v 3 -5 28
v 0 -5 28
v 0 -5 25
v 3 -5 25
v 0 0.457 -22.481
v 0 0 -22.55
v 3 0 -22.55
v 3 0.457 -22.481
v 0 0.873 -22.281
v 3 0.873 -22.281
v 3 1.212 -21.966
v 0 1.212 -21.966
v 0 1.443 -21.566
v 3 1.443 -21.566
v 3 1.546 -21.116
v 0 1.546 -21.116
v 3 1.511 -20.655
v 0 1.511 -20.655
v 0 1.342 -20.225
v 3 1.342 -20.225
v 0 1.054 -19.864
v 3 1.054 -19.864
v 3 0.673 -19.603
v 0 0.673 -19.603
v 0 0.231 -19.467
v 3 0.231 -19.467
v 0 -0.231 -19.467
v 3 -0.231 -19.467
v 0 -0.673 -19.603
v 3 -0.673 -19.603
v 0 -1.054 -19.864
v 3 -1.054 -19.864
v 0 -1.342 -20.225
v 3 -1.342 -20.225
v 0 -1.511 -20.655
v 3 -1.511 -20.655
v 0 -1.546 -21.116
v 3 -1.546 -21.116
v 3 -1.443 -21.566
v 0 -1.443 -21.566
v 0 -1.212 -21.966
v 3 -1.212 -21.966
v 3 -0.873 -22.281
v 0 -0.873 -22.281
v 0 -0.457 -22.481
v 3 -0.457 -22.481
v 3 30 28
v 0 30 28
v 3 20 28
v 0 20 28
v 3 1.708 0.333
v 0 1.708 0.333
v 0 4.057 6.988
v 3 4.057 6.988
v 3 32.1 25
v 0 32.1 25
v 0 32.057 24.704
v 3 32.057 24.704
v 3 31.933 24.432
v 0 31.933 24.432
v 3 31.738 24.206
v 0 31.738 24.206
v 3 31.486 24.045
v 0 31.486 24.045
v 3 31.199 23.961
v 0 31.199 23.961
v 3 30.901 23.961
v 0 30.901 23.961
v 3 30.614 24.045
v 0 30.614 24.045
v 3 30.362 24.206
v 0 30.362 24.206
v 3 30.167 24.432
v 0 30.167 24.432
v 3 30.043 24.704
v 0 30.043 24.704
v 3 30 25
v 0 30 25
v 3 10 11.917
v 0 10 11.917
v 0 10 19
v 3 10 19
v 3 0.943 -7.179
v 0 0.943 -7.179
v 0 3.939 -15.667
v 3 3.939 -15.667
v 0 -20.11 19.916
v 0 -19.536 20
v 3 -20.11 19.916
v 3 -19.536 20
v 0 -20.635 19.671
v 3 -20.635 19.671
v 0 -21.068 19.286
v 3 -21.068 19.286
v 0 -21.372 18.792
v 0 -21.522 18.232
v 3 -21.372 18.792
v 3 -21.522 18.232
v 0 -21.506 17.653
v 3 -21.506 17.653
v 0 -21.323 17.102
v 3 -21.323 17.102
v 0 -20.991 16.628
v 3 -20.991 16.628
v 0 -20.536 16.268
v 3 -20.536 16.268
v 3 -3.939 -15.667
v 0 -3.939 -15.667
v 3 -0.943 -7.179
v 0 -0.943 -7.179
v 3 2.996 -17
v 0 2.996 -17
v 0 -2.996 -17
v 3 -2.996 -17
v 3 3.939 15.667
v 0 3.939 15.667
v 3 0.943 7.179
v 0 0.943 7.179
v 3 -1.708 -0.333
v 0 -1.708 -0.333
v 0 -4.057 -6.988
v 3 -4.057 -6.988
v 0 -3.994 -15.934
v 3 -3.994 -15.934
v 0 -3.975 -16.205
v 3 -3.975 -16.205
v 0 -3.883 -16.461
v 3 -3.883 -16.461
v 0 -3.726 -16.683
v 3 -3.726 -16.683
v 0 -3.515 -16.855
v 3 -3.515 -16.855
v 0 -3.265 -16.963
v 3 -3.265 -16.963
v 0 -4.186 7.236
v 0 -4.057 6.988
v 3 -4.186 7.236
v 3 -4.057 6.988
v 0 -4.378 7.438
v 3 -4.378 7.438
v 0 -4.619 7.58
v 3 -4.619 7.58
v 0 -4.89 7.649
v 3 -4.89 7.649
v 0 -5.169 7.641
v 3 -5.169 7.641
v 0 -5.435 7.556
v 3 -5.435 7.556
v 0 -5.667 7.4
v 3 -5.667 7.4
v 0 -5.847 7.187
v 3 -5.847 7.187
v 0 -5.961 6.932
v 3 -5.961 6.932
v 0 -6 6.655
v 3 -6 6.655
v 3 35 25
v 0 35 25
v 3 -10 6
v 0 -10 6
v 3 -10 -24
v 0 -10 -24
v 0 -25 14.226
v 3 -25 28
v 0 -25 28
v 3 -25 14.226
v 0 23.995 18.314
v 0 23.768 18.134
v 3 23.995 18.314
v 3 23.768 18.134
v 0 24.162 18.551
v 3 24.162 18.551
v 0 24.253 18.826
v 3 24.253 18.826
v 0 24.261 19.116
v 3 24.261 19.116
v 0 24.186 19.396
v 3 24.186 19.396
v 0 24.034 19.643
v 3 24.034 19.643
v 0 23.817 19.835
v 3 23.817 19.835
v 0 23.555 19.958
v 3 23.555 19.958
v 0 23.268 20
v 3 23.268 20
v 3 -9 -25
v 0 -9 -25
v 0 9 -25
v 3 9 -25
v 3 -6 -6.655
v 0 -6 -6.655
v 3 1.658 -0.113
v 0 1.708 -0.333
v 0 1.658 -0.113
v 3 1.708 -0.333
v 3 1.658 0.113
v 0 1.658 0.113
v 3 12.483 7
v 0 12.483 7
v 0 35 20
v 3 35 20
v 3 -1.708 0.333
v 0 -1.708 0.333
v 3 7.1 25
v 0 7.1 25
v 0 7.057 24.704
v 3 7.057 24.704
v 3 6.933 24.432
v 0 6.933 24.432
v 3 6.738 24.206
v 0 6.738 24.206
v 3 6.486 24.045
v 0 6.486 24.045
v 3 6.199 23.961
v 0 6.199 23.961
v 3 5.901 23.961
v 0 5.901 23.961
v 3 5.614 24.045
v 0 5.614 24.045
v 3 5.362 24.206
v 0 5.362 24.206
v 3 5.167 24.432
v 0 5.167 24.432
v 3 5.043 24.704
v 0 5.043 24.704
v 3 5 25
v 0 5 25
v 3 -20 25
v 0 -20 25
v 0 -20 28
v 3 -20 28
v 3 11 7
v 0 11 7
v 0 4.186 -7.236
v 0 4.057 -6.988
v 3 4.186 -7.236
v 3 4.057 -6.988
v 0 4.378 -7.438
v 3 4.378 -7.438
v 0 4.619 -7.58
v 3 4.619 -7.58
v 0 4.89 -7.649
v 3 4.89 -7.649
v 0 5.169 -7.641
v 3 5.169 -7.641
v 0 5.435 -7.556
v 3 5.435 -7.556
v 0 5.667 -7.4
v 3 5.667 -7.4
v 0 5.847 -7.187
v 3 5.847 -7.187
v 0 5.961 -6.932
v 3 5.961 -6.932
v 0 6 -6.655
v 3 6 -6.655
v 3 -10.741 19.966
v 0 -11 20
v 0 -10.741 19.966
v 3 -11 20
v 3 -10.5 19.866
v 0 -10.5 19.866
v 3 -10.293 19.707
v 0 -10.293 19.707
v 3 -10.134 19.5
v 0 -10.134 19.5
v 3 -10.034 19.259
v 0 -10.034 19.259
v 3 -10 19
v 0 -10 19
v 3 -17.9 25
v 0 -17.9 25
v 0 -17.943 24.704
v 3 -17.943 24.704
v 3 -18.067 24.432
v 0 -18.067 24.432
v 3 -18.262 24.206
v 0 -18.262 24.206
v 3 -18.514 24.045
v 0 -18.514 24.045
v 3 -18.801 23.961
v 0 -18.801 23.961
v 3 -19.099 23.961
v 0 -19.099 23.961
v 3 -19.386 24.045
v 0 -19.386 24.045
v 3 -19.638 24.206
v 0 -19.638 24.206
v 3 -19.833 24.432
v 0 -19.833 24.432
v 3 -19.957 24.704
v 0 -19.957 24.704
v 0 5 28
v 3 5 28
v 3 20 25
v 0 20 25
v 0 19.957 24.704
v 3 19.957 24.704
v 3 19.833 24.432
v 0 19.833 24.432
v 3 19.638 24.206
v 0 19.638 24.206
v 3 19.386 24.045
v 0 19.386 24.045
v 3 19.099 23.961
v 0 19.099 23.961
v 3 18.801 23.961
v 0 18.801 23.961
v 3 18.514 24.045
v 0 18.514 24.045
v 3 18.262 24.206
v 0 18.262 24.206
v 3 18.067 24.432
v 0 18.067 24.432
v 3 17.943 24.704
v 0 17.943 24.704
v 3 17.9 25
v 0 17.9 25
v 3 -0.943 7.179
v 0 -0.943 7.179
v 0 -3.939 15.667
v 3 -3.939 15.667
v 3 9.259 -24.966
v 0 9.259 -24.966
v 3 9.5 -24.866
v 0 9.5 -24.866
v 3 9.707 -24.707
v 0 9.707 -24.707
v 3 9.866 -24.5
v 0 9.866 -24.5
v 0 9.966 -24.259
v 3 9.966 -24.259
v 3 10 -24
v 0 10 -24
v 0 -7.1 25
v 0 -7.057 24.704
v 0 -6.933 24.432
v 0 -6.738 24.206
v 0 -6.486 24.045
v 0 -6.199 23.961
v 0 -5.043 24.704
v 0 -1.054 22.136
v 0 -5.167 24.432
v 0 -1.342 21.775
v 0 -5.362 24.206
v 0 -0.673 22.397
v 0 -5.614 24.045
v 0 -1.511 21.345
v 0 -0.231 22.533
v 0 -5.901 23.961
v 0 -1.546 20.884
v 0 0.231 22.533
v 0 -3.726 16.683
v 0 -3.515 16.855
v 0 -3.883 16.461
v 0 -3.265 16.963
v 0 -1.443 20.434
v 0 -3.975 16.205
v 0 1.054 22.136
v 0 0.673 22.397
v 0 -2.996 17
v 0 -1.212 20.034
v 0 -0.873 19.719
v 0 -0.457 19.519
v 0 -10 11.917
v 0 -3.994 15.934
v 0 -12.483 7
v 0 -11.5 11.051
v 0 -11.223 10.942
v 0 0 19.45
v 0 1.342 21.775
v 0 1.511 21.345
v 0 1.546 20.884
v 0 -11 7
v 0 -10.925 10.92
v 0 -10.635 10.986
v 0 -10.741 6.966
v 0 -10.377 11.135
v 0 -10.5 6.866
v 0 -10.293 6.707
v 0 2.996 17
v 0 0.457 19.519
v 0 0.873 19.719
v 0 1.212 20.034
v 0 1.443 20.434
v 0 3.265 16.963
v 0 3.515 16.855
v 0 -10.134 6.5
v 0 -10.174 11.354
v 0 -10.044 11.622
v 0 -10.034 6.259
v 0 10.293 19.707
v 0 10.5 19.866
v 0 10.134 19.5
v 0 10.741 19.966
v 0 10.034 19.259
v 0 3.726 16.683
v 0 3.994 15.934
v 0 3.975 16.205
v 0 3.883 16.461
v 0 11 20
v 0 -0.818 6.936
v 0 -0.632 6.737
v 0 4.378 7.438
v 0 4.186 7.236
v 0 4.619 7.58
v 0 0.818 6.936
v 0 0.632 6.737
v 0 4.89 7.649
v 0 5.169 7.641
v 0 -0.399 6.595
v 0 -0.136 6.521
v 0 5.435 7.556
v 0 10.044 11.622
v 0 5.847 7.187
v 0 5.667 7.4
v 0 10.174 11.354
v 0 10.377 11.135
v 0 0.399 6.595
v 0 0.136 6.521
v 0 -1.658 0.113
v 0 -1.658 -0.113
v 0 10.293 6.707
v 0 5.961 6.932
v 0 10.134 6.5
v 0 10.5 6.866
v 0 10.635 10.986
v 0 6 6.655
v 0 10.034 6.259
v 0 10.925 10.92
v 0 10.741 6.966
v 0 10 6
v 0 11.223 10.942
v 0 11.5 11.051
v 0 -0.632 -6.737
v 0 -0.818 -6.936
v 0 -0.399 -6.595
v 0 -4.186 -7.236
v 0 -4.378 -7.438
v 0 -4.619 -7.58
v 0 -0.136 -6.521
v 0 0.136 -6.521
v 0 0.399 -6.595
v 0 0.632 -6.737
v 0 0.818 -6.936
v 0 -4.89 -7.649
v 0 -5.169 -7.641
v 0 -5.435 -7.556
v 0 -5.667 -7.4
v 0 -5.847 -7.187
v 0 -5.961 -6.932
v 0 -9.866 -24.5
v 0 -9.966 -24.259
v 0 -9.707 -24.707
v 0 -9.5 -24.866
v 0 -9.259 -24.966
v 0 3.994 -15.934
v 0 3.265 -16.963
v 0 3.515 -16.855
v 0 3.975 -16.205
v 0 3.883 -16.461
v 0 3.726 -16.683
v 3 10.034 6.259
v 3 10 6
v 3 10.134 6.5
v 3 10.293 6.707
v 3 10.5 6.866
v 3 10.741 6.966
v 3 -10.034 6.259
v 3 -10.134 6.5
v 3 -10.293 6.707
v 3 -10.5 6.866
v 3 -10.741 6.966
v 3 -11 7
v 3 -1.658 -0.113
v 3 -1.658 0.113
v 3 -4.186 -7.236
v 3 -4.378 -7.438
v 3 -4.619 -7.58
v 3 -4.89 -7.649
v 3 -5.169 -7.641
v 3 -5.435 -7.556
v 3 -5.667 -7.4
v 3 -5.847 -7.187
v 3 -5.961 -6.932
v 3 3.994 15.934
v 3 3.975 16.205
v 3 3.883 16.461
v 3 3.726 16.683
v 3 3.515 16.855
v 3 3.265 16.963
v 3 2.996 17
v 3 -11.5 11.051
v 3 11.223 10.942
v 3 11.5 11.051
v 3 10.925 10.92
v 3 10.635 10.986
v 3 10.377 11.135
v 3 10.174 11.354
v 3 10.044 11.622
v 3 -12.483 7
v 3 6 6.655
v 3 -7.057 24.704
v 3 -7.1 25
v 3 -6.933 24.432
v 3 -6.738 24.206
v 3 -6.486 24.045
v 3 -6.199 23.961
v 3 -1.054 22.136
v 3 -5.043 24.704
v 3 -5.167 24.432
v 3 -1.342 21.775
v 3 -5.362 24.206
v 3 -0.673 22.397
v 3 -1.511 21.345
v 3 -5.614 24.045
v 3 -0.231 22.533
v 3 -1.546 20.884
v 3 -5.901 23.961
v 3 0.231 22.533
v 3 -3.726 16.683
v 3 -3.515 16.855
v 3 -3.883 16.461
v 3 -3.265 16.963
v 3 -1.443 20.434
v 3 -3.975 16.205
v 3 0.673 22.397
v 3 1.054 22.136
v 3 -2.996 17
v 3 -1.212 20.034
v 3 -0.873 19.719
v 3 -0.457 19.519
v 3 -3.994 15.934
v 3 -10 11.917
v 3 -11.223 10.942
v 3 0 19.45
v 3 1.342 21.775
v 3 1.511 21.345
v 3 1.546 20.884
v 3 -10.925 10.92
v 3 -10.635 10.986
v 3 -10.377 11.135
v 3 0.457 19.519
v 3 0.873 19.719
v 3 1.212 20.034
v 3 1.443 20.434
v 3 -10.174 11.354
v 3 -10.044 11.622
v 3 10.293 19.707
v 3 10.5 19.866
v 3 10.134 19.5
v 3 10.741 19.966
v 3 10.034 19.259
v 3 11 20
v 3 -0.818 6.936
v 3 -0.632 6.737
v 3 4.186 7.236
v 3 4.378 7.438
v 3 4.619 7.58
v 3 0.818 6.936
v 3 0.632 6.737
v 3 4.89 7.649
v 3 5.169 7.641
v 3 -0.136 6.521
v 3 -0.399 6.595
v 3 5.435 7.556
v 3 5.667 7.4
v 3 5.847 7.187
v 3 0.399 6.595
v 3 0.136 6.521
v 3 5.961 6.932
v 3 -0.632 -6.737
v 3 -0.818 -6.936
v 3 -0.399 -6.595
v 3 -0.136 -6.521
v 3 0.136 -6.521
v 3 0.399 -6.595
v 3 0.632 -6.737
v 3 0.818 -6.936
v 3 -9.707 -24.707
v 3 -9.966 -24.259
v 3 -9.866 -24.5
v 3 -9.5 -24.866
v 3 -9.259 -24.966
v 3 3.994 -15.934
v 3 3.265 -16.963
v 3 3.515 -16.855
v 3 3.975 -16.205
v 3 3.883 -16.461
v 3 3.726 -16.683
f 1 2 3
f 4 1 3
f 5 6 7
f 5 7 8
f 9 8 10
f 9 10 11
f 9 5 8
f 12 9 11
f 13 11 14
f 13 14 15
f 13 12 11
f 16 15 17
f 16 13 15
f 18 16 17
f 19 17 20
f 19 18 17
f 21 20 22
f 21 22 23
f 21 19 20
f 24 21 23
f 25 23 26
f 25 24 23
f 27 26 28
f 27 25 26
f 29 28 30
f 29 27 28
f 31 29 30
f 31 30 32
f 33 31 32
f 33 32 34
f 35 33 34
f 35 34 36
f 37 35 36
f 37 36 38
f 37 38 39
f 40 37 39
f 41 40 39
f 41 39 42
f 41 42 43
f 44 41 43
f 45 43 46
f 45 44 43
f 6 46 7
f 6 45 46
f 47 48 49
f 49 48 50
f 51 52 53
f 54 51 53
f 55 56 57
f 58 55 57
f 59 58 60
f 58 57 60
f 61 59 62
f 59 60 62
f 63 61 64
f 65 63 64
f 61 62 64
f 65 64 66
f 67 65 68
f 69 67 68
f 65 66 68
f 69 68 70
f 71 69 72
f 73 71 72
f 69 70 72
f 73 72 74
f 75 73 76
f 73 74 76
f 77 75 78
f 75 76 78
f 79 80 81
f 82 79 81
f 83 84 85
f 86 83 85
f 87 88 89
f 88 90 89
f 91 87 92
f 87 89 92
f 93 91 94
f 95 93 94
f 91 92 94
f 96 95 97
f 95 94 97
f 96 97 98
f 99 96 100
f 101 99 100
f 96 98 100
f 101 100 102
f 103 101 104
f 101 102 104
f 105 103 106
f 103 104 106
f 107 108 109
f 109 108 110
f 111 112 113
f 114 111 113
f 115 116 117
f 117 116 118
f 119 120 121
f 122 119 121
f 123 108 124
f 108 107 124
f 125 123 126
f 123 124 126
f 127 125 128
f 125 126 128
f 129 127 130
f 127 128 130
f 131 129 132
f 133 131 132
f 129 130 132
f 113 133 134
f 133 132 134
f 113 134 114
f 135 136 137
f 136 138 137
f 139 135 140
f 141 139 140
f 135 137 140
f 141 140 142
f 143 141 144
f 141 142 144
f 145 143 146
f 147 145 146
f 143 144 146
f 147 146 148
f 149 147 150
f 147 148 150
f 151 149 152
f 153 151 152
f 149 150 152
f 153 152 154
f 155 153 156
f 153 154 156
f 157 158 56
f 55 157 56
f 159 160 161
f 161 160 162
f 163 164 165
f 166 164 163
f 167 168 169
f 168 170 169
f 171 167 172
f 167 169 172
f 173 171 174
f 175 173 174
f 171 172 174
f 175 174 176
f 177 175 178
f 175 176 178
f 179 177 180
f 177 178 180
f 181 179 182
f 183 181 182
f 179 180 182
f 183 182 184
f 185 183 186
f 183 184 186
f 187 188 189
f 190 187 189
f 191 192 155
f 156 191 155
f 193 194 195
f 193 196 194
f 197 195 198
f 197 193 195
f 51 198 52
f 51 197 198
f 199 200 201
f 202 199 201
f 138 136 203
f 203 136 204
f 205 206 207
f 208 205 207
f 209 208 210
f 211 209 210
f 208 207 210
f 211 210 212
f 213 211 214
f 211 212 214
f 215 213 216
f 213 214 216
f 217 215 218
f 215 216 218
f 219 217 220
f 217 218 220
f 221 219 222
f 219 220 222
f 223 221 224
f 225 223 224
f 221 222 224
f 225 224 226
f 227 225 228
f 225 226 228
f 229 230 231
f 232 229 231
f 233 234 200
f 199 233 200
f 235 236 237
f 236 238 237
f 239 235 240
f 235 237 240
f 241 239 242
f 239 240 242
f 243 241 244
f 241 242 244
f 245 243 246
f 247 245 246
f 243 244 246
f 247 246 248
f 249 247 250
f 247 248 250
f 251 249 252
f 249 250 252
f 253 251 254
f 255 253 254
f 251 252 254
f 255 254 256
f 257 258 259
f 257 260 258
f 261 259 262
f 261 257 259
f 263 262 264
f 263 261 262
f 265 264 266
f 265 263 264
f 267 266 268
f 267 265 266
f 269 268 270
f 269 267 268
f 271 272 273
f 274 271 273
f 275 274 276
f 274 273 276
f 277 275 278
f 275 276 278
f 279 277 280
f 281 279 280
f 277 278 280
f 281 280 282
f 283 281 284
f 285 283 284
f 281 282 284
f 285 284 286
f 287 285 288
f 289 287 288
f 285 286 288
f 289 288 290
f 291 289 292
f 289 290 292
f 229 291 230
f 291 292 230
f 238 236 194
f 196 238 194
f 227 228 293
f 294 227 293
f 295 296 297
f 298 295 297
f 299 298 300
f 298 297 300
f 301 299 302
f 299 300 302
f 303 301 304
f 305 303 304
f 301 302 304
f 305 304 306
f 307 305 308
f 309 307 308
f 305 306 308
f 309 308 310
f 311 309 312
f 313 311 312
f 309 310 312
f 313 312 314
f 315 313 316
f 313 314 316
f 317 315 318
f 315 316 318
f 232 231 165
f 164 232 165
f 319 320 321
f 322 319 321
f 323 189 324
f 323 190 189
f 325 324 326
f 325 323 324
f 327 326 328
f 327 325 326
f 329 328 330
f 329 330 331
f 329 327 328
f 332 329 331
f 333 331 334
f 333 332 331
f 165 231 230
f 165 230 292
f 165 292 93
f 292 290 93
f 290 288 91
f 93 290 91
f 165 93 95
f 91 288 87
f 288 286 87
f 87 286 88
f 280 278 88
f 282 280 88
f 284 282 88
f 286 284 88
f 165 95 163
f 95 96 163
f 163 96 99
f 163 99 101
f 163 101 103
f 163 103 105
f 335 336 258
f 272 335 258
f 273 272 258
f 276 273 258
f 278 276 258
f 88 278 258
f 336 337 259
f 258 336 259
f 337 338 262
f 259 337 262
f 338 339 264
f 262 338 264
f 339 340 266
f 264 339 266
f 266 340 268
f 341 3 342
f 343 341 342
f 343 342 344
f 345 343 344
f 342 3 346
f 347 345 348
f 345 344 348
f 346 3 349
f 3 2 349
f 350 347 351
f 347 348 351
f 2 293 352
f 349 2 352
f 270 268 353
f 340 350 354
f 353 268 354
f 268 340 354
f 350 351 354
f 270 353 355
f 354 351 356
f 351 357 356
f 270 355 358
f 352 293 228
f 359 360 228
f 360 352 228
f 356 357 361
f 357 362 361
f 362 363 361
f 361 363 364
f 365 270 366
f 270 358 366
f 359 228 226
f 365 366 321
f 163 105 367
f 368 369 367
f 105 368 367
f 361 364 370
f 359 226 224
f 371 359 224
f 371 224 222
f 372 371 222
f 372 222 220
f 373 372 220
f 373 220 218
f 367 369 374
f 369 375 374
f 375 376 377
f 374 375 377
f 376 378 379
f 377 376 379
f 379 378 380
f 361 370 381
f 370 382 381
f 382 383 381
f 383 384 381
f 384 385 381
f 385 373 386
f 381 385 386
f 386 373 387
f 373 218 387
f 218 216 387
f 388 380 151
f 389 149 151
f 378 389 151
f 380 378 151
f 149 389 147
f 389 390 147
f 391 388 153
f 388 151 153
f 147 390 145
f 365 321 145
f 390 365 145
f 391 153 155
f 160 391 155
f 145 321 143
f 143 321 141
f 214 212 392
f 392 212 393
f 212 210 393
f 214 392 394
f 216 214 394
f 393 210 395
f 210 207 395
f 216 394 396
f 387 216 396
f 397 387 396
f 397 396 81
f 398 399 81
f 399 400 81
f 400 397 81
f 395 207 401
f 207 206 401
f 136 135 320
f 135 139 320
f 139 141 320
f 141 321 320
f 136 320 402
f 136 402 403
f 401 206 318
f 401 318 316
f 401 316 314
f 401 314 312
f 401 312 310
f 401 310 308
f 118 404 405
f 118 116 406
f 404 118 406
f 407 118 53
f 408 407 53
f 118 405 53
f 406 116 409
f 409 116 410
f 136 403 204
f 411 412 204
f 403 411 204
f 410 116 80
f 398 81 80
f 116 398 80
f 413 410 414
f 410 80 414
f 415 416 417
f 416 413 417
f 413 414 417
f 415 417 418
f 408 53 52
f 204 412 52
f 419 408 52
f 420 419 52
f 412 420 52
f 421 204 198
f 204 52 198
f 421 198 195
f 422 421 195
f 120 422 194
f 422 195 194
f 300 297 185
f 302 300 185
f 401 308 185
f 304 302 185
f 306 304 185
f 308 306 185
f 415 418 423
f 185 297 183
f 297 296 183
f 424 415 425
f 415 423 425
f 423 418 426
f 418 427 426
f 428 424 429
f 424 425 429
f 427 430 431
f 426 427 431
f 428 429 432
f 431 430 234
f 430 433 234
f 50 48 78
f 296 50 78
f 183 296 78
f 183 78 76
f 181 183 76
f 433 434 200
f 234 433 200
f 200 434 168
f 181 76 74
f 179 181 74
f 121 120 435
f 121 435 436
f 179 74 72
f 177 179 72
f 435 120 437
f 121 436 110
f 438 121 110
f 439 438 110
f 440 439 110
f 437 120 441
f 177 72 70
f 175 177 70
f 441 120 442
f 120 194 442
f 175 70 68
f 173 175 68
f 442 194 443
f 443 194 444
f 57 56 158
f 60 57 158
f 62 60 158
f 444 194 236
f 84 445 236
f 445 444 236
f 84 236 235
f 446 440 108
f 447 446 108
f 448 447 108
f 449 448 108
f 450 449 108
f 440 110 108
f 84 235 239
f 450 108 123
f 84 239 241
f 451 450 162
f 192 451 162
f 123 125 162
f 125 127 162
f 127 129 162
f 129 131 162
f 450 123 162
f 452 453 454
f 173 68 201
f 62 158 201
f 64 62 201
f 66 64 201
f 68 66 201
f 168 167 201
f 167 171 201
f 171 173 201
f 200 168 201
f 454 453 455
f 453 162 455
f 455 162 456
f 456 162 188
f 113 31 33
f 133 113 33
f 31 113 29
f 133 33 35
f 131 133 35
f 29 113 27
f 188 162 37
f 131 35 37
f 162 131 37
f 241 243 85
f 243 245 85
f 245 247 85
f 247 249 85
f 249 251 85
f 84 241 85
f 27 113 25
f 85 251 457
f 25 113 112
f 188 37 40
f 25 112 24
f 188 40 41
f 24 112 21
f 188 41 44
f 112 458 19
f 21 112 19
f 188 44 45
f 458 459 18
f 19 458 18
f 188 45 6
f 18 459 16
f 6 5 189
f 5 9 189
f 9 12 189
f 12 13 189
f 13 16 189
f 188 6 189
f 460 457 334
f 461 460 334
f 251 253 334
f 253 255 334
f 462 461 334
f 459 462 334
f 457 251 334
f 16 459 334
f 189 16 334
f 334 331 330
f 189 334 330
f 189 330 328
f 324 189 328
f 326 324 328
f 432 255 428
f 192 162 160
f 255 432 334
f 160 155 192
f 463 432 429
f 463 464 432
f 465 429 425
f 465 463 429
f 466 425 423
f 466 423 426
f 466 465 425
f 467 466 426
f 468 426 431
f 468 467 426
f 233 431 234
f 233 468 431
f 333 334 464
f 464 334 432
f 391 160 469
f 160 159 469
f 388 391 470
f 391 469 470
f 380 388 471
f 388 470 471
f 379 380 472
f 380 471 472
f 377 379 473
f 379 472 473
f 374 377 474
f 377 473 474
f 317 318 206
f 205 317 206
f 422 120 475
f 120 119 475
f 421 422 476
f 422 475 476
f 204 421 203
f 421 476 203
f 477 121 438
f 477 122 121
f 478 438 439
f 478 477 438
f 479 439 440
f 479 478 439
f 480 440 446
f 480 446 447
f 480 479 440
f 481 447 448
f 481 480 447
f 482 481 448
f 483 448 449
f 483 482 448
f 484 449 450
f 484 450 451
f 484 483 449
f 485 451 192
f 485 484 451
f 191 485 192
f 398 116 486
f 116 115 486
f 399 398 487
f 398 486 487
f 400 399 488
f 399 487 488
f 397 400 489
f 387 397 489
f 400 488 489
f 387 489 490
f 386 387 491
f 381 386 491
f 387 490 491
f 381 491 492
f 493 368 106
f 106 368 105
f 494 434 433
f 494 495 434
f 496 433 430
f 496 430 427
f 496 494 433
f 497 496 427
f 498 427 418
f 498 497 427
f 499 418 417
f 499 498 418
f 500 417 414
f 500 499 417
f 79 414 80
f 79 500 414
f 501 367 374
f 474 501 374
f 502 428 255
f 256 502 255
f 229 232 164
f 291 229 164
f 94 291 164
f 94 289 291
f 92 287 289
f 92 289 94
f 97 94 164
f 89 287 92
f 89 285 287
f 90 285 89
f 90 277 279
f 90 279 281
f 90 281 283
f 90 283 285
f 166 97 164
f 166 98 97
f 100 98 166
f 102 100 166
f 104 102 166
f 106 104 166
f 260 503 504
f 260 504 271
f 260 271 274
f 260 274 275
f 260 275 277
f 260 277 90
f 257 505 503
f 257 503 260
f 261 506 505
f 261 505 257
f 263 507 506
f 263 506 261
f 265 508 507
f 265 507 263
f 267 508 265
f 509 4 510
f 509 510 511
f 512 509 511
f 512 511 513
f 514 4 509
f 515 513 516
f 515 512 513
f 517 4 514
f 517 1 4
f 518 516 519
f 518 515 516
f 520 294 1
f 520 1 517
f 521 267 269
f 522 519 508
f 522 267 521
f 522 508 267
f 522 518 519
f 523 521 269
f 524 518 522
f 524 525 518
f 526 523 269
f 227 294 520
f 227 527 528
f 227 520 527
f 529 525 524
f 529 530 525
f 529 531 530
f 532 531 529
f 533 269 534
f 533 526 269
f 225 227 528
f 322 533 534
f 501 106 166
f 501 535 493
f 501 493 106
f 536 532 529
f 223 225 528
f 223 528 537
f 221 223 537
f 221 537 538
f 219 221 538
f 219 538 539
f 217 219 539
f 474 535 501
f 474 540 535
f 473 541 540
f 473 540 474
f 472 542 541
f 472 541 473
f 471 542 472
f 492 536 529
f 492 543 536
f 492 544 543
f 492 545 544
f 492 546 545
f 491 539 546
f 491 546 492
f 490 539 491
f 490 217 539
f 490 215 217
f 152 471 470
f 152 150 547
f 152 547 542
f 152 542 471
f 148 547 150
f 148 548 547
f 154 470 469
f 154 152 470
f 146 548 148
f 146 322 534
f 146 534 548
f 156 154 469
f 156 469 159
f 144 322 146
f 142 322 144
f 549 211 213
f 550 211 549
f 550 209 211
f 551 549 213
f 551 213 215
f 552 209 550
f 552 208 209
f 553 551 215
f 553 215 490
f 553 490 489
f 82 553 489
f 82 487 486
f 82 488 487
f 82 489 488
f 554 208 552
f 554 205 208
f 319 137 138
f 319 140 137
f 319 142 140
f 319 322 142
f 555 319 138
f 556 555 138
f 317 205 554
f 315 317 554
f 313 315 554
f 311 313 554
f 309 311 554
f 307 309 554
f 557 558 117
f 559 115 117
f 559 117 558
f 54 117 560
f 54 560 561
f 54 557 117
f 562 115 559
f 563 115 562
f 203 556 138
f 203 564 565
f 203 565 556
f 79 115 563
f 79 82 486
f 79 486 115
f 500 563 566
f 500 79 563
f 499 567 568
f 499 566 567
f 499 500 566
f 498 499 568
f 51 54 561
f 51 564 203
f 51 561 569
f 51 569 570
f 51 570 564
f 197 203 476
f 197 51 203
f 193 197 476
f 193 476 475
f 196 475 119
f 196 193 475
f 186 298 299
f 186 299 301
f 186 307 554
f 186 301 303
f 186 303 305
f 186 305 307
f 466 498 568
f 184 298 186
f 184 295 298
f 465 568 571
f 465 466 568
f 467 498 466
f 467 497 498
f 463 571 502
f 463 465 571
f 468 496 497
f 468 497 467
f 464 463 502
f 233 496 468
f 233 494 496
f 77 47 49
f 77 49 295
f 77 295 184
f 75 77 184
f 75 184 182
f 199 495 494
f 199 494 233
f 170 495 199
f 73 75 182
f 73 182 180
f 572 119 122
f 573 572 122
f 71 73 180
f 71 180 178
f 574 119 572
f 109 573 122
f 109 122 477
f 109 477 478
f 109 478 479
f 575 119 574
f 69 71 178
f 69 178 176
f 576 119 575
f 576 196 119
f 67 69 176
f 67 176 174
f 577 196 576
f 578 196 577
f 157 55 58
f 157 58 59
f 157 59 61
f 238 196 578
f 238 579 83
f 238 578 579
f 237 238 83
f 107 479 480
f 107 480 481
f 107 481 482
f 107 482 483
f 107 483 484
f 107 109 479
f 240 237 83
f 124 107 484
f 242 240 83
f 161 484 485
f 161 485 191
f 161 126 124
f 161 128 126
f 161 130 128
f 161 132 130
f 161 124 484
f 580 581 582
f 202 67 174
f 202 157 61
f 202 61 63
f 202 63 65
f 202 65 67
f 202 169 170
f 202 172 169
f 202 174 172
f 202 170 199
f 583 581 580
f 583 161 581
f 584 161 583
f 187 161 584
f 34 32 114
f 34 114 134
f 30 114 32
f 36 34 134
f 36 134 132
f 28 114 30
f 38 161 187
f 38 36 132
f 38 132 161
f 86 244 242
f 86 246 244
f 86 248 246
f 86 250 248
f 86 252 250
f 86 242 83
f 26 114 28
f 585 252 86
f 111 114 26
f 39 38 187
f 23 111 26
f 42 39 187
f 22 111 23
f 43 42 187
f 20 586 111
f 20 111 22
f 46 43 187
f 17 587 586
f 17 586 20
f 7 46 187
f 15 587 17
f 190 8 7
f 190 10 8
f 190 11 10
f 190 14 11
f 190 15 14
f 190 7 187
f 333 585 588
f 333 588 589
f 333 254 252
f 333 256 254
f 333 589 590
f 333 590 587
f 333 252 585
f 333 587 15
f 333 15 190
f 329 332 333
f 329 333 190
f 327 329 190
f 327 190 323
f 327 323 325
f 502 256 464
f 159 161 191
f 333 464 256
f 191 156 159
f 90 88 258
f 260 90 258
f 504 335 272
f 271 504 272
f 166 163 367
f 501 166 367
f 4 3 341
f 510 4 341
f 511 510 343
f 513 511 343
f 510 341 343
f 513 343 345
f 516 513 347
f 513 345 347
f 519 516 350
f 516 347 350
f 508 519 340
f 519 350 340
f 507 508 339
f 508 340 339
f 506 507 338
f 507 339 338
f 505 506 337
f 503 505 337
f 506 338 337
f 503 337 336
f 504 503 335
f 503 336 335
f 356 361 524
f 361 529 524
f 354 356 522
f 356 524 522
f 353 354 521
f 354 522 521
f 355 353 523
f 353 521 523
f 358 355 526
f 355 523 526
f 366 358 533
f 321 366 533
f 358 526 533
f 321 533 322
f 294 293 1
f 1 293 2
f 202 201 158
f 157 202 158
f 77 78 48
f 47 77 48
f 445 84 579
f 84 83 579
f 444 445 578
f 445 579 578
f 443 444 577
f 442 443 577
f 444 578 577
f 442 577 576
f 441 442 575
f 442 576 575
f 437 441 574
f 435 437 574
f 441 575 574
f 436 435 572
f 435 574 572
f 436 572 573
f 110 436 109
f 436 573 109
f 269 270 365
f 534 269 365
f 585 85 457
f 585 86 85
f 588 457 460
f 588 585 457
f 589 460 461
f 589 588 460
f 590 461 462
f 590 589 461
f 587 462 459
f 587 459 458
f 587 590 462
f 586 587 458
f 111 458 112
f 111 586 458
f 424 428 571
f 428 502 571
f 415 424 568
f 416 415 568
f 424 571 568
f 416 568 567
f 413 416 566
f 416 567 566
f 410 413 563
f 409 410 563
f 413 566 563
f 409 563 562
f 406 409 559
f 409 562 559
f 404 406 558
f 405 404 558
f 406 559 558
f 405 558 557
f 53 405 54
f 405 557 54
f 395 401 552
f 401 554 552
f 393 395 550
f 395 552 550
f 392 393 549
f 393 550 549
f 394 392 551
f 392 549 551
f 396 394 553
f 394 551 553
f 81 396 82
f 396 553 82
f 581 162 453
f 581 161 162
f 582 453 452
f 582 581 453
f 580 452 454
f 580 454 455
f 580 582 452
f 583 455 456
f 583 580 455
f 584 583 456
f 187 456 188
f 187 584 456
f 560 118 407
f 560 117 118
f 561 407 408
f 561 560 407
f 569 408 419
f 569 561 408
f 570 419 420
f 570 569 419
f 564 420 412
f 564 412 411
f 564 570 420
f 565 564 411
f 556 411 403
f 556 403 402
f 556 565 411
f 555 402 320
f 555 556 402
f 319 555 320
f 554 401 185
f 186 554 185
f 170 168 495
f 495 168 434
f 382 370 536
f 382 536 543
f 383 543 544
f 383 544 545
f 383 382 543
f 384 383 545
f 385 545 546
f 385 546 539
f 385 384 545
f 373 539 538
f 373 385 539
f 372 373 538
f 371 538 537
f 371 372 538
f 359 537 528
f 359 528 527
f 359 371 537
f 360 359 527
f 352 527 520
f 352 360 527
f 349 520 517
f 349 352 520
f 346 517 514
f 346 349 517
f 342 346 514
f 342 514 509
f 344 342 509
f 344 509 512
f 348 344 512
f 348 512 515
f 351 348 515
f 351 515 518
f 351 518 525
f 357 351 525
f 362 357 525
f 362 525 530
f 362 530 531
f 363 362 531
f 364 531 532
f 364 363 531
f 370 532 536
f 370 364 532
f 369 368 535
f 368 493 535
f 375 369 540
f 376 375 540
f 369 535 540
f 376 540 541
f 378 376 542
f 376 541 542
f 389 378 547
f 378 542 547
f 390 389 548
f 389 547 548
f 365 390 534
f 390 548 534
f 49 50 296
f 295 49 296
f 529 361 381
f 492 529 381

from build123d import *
from OCP.BRepFilletAPI import BRepFilletAPI_MakeFillet

# Parameters (mm, degrees)
SKETCH_1_R          = 1.55
EXTRUDE_1_DEPTH     = 3
FILLET_1_R1         = 1
FILLET_1_R2         = 2
SKETCH_2_W          = 23.55236831
SKETCH_2_H          = 10
CUT_EXTRUDE_1_DEPTH = 10


with BuildPart() as part:
    # 草图1 → 凸台-拉伸1 (new body)
    with BuildSketch(Plane(origin=(0, 0, 0), x_dir=(0, 0, -1), z_dir=(1, 0, 0))):
        with BuildLine():
            Line((-7, -10), (25, -10))
            Line((25, -10), (25, 10))
            Line((25, 10), (-7, 10))
            Line((-7, 10), (-7, 12.483339502))
            Line((-7, 12.483339502), (-20, 35))
            Line((-20, 35), (-25, 35))
            Line((-25, 35), (-25, 32.1))
            ThreePointArc((-25, 32.1), (-24.25753788, 31.79246212), (-23.95, 31.05))
            ThreePointArc((-23.95, 31.05), (-24.25753788, 30.30753788), (-25, 30))
            Line((-25, 30), (-28, 30))
            Line((-28, 30), (-28, 20))
            Line((-28, 20), (-25, 20))
            ThreePointArc((-25, 20), (-24.25753788, 19.69246212), (-23.95, 18.95))
            ThreePointArc((-23.95, 18.95), (-24.25753788, 18.20753788), (-25, 17.9))
            Line((-25, 17.9), (-25, 10))
            Line((-25, 10), (-25, 7.1))
            ThreePointArc((-25, 7.1), (-24.25753788, 6.79246212), (-23.95, 6.05))
            ThreePointArc((-23.95, 6.05), (-24.25753788, 5.30753788), (-25, 5))
            Line((-25, 5), (-28, 5))
            Line((-28, 5), (-28, -5))
            Line((-28, -5), (-25, -5))
            ThreePointArc((-25, -5), (-24.25753788, -5.30753788), (-23.95, -6.05))
            ThreePointArc((-23.95, -6.05), (-24.25753788, -6.79246212), (-25, -7.1))
            Line((-25, -7.1), (-25, -10))
            Line((-25, -10), (-25, -17.9))
            ThreePointArc((-25, -17.9), (-24.25753788, -18.20753788), (-23.95, -18.95))
            ThreePointArc((-23.95, -18.95), (-24.25753788, -19.69246212), (-25, -20))
            Line((-25, -20), (-28, -20))
            Line((-28, -20), (-28, -30))
            Line((-28, -30), (-25, -30))
            ThreePointArc((-25, -30), (-24.25753788, -30.30753788), (-23.95, -31.05))
            ThreePointArc((-23.95, -31.05), (-24.25753788, -31.79246212), (-25, -32.1))
            Line((-25, -32.1), (-25, -35))
            Line((-25, -35), (-20, -35))
            Line((-20, -35), (-7, -12.483339502))
            Line((-7, -12.483339502), (-7, -10))
        make_face()
        Polygon((-10.185045424, -10), (-20, -27), (-20, -10), align=None, mode=Mode.SUBTRACT)
        Polygon((12.493060906, -6), (-12.493060906, -6), (0, -1.590684386), align=None, mode=Mode.SUBTRACT)
        with Locations((-21, 0)):
            Circle(SKETCH_1_R, mode=Mode.SUBTRACT)
        Polygon((-4.506939094, 0), (-17, -4.409315614), (-17, 4.409315614), align=None, mode=Mode.SUBTRACT)
        Polygon((-10.185045424, 10), (-20, 10), (-20, 27), align=None, mode=Mode.SUBTRACT)
        Polygon((0, 1.590684386), (-12.493060906, 6), (12.493060906, 6), align=None, mode=Mode.SUBTRACT)
        Polygon((17, 4.409315614), (17, -4.409315614), (4.506939094, 0), align=None, mode=Mode.SUBTRACT)
        with Locations((21, 0)):
            Circle(SKETCH_1_R, mode=Mode.SUBTRACT)
    extrude(amount=EXTRUDE_1_DEPTH)

    # 圆角1: one fillet with a radius per group of edges: ONE call of the kernel's fillet builder (fillet() takes one radius for all edges)
    fillet_1_edges_1 = [part.edges().sort_by_distance(p)[0] for p in [
        (1.5, -10, 10.185045424),
        (1.5, -10, 20),
        (1.5, 10, 10.185045424),
        (1.5, 10, 20),
        (1.5, 27, 20),
        (1.5, 10, 7),
        (1.5, 10, -25),
        (1.5, -10, -25),
        (1.5, -10, 7),
        (1.5, -4.409315614, 17),
        (1.5, 1.590684386, 0),
        (1.5, 6, 12.493060906),
        (1.5, 6, -12.493060906),
        (1.5, 4.409315614, 17),
        (1.5, 0, 4.506939094),
        (1.5, 0, -4.506939094),
        (1.5, 4.409315614, -17),
        (1.5, -4.409315614, -17),
        (1.5, -1.590684386, 0),
        (1.5, -6, -12.493060906),
        (1.5, -6, 12.493060906),
    ]]
    fillet_1_edges_2 = [part.edges().sort_by_distance(p)[0] for p in [
        (1.5, -27, 20),
    ]]
    fillet_1 = BRepFilletAPI_MakeFillet(part.part.solid().wrapped)
    for e in fillet_1_edges_1:
        fillet_1.Add(FILLET_1_R1, e.wrapped)
    for e in fillet_1_edges_2:
        fillet_1.Add(FILLET_1_R2, e.wrapped)
    add(Compound.cast(fillet_1.Shape()), mode=Mode.REPLACE)

    # 草图2 → 切除-拉伸1 (cut)
    with BuildSketch(Plane(origin=(3, 0, 0), x_dir=(0, 0, -1), z_dir=(1, 0, 0))):
        with Locations((-22.372535414, -30)):
            Rectangle(SKETCH_2_W, SKETCH_2_H)
    extrude(amount=-CUT_EXTRUDE_1_DEPTH, mode=Mode.SUBTRACT)


solid = part.part
